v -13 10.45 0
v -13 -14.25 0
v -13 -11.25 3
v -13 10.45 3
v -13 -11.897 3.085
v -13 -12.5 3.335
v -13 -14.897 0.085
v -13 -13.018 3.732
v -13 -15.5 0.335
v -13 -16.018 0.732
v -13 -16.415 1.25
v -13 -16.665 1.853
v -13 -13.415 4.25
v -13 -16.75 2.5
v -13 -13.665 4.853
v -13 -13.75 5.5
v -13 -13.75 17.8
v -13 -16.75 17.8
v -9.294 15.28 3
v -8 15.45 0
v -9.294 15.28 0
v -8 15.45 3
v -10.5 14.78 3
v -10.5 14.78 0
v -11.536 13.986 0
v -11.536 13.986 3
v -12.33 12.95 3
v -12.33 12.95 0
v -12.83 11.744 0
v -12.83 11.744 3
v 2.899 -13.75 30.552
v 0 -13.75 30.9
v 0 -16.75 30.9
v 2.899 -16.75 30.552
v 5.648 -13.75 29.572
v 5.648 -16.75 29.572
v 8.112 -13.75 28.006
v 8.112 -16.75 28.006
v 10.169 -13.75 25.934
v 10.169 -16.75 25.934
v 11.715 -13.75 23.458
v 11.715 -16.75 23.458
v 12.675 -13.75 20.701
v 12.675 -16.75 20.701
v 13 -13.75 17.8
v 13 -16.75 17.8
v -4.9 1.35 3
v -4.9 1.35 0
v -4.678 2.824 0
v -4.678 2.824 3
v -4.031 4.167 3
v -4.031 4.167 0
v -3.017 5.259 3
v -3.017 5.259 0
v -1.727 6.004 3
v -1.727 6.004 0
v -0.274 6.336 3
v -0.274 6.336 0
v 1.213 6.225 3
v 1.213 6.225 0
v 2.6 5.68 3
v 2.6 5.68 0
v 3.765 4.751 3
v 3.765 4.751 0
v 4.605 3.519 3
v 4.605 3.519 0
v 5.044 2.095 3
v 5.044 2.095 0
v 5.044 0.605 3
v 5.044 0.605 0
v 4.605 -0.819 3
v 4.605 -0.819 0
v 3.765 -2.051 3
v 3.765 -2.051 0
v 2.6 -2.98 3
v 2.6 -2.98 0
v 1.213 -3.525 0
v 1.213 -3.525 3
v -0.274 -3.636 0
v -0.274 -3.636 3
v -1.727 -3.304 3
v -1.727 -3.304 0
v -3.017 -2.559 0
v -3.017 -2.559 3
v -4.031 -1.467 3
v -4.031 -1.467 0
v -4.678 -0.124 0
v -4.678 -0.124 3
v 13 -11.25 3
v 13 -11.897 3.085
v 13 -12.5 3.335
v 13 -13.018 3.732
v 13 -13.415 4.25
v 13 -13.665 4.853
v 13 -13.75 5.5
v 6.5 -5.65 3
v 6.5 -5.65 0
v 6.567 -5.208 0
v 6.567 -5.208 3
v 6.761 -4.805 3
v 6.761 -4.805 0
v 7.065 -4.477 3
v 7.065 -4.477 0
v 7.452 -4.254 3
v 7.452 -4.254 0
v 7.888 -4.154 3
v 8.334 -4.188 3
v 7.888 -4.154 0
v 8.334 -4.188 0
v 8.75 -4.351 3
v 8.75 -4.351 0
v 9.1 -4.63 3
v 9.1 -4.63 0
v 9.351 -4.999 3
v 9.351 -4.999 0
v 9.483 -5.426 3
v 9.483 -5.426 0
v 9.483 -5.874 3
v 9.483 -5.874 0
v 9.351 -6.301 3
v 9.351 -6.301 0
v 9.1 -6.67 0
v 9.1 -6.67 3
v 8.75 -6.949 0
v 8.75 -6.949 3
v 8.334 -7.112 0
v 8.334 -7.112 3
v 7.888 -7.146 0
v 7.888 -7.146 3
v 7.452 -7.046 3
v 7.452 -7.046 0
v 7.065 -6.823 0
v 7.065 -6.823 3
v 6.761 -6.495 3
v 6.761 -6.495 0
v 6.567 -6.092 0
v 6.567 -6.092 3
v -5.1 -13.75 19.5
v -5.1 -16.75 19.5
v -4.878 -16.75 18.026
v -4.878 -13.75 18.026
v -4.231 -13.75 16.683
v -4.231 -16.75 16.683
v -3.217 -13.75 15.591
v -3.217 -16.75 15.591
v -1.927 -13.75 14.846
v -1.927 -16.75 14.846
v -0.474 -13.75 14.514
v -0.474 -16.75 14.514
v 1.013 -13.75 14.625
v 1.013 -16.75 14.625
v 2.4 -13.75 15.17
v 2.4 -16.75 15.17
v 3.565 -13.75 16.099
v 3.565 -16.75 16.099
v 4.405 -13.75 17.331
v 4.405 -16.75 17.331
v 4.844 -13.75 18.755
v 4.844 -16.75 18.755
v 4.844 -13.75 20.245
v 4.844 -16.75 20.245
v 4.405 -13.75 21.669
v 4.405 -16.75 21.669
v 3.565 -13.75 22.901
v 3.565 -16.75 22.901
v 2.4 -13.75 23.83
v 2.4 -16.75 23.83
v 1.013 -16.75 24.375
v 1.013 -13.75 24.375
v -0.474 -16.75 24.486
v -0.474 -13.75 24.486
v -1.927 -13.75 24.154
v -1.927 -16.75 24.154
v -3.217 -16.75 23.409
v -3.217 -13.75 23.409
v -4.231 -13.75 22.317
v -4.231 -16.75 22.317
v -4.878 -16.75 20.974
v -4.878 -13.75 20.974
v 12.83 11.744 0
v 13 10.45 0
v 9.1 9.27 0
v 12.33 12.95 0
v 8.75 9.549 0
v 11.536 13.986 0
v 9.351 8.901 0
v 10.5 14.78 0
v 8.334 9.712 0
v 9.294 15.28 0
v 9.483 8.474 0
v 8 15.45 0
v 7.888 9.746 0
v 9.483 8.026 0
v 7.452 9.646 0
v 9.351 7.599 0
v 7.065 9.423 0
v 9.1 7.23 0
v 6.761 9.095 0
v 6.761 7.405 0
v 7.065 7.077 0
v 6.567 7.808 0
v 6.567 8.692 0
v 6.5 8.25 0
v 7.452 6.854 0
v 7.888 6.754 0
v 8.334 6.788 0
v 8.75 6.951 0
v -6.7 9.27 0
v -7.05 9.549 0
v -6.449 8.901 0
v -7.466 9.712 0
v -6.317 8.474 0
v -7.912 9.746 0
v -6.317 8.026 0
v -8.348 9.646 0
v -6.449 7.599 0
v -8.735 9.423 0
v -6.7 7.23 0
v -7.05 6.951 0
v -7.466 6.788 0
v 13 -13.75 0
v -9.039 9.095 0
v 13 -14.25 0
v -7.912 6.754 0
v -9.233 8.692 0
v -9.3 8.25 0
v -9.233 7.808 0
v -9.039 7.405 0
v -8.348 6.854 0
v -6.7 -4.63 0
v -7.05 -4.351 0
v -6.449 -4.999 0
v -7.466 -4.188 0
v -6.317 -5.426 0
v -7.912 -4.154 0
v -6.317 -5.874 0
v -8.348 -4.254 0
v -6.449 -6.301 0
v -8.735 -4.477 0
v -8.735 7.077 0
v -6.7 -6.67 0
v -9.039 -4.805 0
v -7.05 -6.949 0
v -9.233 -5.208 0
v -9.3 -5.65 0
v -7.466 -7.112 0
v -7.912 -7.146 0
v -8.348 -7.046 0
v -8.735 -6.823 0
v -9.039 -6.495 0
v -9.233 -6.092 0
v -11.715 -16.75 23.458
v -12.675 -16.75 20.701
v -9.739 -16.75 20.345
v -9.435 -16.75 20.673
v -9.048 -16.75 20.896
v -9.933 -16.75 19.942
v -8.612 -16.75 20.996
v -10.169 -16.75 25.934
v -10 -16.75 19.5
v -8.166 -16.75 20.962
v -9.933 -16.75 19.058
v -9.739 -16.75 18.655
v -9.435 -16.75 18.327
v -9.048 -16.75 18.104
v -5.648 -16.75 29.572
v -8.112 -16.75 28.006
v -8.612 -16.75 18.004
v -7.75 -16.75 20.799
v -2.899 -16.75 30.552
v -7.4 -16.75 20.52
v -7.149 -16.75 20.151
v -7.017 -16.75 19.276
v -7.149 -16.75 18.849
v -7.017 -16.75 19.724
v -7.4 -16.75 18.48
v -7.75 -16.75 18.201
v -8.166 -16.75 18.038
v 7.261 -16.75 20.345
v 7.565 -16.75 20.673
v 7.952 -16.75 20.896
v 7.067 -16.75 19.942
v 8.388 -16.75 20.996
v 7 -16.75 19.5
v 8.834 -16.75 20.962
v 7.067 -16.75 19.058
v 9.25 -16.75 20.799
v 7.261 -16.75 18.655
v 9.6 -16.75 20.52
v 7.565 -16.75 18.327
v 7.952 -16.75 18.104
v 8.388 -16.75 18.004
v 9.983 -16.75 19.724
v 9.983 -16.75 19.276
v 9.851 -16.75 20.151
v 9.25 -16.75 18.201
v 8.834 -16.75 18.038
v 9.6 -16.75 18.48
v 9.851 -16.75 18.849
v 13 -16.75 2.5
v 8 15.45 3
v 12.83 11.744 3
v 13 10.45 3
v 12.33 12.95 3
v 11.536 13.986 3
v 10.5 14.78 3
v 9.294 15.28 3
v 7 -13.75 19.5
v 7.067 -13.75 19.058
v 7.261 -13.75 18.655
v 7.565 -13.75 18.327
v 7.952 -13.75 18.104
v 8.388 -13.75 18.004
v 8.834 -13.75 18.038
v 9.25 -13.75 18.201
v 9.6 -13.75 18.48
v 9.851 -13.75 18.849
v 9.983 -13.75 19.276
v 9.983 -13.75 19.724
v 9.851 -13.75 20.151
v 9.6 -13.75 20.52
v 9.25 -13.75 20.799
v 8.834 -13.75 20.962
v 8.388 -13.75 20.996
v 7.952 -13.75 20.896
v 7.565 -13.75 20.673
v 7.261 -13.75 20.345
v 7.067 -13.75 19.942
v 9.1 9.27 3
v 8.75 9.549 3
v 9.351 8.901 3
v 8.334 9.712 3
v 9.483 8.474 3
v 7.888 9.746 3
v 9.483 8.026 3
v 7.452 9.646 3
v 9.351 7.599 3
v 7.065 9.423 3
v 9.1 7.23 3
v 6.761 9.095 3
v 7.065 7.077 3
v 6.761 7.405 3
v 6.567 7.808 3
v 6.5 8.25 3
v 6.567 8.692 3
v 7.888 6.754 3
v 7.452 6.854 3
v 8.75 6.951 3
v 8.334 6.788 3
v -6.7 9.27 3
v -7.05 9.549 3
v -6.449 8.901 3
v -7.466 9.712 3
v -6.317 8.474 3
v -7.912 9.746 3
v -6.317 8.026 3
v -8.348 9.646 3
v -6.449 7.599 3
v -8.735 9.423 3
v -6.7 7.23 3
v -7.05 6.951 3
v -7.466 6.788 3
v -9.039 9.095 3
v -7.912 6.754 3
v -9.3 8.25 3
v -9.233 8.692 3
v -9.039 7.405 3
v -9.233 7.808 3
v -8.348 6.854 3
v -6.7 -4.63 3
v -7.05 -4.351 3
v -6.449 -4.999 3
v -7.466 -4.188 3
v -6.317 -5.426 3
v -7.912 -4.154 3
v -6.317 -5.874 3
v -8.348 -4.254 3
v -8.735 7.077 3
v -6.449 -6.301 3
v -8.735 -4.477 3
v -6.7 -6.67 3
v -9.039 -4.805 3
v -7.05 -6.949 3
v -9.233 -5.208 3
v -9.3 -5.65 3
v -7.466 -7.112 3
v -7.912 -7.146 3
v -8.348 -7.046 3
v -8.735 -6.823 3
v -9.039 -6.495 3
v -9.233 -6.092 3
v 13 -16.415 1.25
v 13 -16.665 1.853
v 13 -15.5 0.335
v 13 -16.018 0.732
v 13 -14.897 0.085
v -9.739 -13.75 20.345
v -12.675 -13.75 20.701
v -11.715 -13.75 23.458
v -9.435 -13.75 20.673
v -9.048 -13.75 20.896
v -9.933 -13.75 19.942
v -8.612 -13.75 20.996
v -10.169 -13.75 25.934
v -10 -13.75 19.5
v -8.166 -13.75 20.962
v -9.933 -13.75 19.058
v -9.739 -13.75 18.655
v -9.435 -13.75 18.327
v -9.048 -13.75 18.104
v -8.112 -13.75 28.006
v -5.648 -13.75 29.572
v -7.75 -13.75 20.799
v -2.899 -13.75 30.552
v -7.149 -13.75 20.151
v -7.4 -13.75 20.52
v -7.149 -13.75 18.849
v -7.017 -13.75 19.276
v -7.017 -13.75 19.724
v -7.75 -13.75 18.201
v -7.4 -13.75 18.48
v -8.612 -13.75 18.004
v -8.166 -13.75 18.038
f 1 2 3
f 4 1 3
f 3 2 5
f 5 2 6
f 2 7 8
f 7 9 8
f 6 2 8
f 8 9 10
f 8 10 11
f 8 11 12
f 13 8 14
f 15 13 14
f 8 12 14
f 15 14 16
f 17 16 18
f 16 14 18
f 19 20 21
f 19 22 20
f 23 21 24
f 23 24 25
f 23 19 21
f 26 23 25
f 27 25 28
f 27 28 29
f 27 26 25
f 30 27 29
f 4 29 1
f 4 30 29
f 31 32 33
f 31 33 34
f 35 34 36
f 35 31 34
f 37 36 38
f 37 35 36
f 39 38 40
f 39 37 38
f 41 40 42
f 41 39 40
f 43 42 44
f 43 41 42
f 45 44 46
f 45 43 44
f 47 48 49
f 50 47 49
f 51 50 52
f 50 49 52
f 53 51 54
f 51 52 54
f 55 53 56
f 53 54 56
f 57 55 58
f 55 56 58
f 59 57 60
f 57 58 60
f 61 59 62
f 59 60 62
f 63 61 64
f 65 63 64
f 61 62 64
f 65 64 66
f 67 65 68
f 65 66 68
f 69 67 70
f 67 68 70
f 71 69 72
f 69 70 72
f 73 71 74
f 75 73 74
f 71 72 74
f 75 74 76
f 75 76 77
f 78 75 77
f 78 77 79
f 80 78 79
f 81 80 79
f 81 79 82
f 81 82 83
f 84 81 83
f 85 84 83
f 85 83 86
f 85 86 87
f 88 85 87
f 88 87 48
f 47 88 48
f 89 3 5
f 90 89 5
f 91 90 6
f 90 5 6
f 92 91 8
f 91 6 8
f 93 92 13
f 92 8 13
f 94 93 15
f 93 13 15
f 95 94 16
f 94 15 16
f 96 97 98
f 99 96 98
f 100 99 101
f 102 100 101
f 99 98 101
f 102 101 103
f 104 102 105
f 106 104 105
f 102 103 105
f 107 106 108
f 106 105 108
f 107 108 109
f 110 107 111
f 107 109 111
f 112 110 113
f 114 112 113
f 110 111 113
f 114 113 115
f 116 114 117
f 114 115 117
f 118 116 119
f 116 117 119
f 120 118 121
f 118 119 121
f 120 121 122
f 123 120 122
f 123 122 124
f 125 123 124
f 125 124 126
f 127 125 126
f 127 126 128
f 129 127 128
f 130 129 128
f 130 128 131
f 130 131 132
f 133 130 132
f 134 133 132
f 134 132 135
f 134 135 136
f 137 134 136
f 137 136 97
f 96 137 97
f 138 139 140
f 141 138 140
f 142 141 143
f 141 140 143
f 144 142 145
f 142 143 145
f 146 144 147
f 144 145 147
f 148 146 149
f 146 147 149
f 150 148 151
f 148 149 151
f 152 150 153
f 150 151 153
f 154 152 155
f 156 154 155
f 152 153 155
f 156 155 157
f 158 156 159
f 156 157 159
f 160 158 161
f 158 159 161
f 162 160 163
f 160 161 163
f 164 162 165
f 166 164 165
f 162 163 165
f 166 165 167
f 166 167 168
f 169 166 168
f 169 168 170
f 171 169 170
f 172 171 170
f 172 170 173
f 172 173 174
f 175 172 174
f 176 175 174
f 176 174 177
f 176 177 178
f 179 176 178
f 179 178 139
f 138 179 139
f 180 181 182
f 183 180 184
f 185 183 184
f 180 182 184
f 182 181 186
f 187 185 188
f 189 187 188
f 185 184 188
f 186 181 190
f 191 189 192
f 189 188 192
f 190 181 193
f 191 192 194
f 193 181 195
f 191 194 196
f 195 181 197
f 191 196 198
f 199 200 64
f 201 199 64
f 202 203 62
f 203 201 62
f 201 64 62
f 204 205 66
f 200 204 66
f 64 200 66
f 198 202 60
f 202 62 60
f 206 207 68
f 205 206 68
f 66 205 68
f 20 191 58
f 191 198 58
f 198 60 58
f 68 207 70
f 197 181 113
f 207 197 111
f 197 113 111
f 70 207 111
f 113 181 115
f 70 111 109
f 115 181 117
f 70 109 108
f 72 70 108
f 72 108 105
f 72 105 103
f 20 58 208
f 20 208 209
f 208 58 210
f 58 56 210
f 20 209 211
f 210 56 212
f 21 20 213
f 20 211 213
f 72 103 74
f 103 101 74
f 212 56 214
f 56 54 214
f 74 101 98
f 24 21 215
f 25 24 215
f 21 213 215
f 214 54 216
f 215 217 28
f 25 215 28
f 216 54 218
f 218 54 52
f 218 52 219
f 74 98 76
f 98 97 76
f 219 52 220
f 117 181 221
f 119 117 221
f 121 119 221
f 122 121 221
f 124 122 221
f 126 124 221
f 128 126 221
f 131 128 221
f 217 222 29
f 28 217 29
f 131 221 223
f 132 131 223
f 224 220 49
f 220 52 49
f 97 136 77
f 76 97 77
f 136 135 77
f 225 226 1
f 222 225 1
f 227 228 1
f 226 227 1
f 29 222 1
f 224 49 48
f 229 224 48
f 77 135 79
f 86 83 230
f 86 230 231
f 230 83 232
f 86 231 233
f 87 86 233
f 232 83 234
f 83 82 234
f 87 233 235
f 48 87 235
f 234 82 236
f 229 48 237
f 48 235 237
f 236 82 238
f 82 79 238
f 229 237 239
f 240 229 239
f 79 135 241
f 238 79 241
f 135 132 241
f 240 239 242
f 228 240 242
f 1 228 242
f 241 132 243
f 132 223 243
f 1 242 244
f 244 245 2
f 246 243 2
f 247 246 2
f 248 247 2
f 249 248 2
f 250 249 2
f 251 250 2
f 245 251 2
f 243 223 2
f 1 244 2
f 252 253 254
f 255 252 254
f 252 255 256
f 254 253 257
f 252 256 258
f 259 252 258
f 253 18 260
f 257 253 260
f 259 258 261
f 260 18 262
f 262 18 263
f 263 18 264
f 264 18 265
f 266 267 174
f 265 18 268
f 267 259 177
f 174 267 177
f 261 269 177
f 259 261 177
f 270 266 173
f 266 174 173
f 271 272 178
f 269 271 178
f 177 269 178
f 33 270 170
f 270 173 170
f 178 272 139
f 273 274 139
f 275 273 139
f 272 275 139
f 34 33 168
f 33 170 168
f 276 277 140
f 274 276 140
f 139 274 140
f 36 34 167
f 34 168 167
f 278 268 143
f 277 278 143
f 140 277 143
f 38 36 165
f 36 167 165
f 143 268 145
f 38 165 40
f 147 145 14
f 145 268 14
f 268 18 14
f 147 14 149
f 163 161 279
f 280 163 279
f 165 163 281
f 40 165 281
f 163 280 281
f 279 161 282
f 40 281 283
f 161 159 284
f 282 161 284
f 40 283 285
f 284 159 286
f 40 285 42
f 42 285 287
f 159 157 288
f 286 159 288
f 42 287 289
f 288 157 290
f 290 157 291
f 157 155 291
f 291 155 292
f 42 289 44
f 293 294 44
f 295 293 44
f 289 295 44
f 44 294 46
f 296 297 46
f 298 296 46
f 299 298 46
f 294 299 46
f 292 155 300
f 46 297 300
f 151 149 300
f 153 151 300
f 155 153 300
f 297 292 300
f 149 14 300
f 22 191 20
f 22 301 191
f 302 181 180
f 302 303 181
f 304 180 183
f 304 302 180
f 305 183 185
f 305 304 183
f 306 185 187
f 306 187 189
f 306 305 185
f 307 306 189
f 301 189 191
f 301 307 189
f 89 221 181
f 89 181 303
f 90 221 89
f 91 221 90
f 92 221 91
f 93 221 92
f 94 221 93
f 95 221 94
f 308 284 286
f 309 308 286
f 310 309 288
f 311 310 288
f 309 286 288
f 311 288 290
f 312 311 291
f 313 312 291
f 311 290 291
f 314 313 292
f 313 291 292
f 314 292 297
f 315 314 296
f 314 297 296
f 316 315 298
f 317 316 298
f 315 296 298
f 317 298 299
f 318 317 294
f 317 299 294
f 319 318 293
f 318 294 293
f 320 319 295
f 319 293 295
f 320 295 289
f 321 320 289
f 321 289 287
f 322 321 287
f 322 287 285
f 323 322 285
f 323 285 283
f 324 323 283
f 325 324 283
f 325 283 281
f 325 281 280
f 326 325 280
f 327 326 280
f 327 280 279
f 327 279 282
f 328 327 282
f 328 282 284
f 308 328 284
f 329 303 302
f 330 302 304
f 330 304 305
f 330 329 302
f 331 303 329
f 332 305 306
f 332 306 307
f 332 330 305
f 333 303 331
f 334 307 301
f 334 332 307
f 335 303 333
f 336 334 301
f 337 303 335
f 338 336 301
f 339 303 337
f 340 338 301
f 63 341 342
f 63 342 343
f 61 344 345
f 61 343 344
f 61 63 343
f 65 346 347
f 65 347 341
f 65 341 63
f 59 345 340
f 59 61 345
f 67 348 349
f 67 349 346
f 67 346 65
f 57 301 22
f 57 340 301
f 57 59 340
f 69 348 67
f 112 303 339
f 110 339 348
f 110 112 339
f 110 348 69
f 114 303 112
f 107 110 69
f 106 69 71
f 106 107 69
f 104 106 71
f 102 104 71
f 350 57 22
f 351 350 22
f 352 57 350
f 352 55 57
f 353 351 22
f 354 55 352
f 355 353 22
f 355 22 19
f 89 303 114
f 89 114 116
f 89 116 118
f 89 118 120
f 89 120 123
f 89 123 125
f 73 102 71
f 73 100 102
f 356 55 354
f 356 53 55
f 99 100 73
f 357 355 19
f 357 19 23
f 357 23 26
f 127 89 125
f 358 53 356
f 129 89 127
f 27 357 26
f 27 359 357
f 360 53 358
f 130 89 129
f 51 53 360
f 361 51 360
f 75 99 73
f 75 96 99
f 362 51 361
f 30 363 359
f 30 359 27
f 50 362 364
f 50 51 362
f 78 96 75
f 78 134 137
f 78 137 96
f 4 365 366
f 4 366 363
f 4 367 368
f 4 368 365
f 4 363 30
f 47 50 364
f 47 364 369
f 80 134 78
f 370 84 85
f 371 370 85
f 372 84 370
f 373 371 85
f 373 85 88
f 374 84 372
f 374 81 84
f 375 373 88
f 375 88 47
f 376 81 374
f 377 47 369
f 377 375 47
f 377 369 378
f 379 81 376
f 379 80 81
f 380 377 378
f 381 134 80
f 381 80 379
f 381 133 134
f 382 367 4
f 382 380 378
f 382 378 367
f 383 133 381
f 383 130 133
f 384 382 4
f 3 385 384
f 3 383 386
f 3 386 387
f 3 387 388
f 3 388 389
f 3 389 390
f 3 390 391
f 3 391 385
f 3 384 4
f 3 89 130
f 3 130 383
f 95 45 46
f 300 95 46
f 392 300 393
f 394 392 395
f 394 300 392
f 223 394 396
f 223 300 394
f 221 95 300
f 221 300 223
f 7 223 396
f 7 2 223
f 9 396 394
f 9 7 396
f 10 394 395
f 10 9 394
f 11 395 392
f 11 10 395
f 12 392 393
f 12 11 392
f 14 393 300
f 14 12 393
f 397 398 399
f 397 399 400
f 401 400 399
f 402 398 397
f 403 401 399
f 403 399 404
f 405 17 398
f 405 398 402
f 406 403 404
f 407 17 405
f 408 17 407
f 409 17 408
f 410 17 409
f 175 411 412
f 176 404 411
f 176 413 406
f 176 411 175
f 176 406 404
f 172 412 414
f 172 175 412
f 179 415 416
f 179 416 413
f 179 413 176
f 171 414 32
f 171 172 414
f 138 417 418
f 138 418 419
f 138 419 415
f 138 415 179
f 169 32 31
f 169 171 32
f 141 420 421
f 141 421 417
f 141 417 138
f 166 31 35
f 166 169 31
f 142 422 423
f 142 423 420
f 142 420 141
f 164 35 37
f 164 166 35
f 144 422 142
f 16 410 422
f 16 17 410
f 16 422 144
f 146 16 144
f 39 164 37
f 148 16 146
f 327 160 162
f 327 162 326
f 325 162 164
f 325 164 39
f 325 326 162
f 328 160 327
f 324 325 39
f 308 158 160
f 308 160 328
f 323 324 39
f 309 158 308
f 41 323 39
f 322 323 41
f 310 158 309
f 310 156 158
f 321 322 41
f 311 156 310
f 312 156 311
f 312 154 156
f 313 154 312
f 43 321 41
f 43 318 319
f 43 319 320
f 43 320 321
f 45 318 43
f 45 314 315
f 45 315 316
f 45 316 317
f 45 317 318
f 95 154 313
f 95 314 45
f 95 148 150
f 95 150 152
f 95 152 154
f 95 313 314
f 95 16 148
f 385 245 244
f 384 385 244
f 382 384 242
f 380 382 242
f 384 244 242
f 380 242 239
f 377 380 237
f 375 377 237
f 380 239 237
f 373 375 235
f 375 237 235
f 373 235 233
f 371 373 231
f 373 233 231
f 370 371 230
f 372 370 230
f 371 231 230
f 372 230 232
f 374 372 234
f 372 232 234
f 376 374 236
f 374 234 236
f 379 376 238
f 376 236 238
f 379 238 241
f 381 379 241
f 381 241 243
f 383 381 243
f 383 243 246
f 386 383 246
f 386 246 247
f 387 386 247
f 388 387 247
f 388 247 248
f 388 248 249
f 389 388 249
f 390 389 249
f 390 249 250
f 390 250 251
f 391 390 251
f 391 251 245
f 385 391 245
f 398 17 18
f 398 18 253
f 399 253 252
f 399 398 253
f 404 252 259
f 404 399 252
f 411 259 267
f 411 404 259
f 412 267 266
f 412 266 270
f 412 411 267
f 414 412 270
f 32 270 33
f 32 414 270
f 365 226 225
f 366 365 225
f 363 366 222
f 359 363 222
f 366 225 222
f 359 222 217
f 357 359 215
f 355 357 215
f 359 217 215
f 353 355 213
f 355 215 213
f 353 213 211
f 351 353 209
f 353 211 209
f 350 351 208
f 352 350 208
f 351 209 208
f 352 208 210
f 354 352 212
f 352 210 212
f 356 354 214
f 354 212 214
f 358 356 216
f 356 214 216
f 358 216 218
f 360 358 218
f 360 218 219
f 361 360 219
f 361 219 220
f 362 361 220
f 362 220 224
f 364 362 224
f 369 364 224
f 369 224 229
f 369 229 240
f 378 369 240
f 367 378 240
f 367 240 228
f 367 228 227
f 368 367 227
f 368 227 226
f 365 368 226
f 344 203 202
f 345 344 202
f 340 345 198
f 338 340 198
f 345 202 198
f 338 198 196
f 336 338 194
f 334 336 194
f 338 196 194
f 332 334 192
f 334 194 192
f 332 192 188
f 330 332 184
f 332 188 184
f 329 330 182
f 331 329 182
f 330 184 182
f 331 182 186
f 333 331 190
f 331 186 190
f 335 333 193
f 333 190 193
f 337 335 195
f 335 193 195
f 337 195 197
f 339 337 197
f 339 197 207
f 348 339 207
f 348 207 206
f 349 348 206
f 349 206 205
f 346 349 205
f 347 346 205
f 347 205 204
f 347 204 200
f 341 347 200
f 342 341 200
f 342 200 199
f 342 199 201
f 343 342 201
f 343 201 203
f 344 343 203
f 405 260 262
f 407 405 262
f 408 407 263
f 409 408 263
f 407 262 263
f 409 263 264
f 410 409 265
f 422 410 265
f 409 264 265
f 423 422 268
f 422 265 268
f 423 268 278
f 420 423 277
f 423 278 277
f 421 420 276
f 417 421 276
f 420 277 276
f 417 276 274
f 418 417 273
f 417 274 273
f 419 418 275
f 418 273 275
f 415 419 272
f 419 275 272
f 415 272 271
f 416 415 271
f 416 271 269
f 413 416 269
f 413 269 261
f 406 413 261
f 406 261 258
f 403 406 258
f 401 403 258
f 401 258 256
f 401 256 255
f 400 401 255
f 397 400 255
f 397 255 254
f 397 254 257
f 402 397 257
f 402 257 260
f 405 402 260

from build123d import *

# Parameters (mm, degrees)
BOSS_EXTRUDE1_DEPTH        = 3
SKETCH2_W                  = 26
SKETCH2_H                  = 3
BOSS_EXTRUDE2_DEPTH        = 29.2
F_10_0_10_DIAMETER_HOLE1_D = 10
F_3_0_3_DIAMETER_HOLE1_D   = 3
F_10_0_10_DIAMETER_HOLE2_D = 10
F_3_0_3_DIAMETER_HOLE2_D   = 3
FILLET1_R                  = 2.5
FILLET3_R                  = 5


with BuildPart() as part:
    # Sketch1 → Boss-Extrude1 (new body)
    with BuildSketch(Plane(origin=(0, -13.75, 0), x_dir=(1, 0, 0), z_dir=(0, 1, 0))):
        with BuildLine():
            Line((13.000000223, -17.8), (13.000000223, 0))
            Line((13.000000223, 0), (-13, 0))
            Line((-13, 0), (-13, -17.8))
            ThreePointArc((-13, -17.8), (-9.198386918, -27.027675803), (1.11e-07, -30.899618316))
            ThreePointArc((1.11e-07, -30.899618316), (9.19838714, -27.027675803), (13.000000223, -17.8))
        make_face()
    extrude(amount=-BOSS_EXTRUDE1_DEPTH)

    # Sketch2 → Boss-Extrude2 (add)
    with BuildSketch(Plane(origin=(0, -13.75, 0), x_dir=(-1, 0, 0), z_dir=(0, 1, 0))):
        with Locations((0, 1.5)):
            Rectangle(SKETCH2_W, SKETCH2_H)
    extrude(amount=BOSS_EXTRUDE2_DEPTH)

    # Ø10.0 (10) Diameter Hole1 (through all)
    with Locations(Plane(origin=(0, -13.75, 0), x_dir=(1, 0, 0), z_dir=(0, 1, 0))):
        with Locations((-0.099999806, -19.5)):
            Hole(F_10_0_10_DIAMETER_HOLE1_D / 2)

    # Ø3.0 (3) Diameter Hole1 (through all)
    with Locations(Plane(origin=(0, -13.75, 0), x_dir=(1, 0, 0), z_dir=(0, 1, 0))):
        with Locations((8.5, -19.5), (-8.5, -19.5)):
            Hole(F_3_0_3_DIAMETER_HOLE1_D / 2)

    # Ø10.0 (10) Diameter Hole2 (through all)
    with Locations(Plane.XY.offset(3)):
        with Locations((0.1, 1.35)):
            Hole(F_10_0_10_DIAMETER_HOLE2_D / 2)

    # Ø3.0 (3) Diameter Hole2 (through all)
    with Locations(Plane.XY.offset(3)):
        with Locations((-7.8, 8.25), (8, -5.65), (-7.8, -5.65), (8, 8.25)):
            Hole(F_3_0_3_DIAMETER_HOLE2_D / 2)

    # Fillet1
    fillet1_edges = [part.edges().sort_by_distance(p)[0] for p in [
        (1.11e-07, -16.75, 0),
        (0, -13.75, 3),
    ]]
    fillet(fillet1_edges, radius=FILLET1_R)

    # Fillet3
    fillet3_edges = [part.edges().sort_by_distance(p)[0] for p in [
        (13, 15.45, 1.5),
        (-13, 15.45, 1.5),
    ]]
    fillet(fillet3_edges, radius=FILLET3_R)


solid = part.part
